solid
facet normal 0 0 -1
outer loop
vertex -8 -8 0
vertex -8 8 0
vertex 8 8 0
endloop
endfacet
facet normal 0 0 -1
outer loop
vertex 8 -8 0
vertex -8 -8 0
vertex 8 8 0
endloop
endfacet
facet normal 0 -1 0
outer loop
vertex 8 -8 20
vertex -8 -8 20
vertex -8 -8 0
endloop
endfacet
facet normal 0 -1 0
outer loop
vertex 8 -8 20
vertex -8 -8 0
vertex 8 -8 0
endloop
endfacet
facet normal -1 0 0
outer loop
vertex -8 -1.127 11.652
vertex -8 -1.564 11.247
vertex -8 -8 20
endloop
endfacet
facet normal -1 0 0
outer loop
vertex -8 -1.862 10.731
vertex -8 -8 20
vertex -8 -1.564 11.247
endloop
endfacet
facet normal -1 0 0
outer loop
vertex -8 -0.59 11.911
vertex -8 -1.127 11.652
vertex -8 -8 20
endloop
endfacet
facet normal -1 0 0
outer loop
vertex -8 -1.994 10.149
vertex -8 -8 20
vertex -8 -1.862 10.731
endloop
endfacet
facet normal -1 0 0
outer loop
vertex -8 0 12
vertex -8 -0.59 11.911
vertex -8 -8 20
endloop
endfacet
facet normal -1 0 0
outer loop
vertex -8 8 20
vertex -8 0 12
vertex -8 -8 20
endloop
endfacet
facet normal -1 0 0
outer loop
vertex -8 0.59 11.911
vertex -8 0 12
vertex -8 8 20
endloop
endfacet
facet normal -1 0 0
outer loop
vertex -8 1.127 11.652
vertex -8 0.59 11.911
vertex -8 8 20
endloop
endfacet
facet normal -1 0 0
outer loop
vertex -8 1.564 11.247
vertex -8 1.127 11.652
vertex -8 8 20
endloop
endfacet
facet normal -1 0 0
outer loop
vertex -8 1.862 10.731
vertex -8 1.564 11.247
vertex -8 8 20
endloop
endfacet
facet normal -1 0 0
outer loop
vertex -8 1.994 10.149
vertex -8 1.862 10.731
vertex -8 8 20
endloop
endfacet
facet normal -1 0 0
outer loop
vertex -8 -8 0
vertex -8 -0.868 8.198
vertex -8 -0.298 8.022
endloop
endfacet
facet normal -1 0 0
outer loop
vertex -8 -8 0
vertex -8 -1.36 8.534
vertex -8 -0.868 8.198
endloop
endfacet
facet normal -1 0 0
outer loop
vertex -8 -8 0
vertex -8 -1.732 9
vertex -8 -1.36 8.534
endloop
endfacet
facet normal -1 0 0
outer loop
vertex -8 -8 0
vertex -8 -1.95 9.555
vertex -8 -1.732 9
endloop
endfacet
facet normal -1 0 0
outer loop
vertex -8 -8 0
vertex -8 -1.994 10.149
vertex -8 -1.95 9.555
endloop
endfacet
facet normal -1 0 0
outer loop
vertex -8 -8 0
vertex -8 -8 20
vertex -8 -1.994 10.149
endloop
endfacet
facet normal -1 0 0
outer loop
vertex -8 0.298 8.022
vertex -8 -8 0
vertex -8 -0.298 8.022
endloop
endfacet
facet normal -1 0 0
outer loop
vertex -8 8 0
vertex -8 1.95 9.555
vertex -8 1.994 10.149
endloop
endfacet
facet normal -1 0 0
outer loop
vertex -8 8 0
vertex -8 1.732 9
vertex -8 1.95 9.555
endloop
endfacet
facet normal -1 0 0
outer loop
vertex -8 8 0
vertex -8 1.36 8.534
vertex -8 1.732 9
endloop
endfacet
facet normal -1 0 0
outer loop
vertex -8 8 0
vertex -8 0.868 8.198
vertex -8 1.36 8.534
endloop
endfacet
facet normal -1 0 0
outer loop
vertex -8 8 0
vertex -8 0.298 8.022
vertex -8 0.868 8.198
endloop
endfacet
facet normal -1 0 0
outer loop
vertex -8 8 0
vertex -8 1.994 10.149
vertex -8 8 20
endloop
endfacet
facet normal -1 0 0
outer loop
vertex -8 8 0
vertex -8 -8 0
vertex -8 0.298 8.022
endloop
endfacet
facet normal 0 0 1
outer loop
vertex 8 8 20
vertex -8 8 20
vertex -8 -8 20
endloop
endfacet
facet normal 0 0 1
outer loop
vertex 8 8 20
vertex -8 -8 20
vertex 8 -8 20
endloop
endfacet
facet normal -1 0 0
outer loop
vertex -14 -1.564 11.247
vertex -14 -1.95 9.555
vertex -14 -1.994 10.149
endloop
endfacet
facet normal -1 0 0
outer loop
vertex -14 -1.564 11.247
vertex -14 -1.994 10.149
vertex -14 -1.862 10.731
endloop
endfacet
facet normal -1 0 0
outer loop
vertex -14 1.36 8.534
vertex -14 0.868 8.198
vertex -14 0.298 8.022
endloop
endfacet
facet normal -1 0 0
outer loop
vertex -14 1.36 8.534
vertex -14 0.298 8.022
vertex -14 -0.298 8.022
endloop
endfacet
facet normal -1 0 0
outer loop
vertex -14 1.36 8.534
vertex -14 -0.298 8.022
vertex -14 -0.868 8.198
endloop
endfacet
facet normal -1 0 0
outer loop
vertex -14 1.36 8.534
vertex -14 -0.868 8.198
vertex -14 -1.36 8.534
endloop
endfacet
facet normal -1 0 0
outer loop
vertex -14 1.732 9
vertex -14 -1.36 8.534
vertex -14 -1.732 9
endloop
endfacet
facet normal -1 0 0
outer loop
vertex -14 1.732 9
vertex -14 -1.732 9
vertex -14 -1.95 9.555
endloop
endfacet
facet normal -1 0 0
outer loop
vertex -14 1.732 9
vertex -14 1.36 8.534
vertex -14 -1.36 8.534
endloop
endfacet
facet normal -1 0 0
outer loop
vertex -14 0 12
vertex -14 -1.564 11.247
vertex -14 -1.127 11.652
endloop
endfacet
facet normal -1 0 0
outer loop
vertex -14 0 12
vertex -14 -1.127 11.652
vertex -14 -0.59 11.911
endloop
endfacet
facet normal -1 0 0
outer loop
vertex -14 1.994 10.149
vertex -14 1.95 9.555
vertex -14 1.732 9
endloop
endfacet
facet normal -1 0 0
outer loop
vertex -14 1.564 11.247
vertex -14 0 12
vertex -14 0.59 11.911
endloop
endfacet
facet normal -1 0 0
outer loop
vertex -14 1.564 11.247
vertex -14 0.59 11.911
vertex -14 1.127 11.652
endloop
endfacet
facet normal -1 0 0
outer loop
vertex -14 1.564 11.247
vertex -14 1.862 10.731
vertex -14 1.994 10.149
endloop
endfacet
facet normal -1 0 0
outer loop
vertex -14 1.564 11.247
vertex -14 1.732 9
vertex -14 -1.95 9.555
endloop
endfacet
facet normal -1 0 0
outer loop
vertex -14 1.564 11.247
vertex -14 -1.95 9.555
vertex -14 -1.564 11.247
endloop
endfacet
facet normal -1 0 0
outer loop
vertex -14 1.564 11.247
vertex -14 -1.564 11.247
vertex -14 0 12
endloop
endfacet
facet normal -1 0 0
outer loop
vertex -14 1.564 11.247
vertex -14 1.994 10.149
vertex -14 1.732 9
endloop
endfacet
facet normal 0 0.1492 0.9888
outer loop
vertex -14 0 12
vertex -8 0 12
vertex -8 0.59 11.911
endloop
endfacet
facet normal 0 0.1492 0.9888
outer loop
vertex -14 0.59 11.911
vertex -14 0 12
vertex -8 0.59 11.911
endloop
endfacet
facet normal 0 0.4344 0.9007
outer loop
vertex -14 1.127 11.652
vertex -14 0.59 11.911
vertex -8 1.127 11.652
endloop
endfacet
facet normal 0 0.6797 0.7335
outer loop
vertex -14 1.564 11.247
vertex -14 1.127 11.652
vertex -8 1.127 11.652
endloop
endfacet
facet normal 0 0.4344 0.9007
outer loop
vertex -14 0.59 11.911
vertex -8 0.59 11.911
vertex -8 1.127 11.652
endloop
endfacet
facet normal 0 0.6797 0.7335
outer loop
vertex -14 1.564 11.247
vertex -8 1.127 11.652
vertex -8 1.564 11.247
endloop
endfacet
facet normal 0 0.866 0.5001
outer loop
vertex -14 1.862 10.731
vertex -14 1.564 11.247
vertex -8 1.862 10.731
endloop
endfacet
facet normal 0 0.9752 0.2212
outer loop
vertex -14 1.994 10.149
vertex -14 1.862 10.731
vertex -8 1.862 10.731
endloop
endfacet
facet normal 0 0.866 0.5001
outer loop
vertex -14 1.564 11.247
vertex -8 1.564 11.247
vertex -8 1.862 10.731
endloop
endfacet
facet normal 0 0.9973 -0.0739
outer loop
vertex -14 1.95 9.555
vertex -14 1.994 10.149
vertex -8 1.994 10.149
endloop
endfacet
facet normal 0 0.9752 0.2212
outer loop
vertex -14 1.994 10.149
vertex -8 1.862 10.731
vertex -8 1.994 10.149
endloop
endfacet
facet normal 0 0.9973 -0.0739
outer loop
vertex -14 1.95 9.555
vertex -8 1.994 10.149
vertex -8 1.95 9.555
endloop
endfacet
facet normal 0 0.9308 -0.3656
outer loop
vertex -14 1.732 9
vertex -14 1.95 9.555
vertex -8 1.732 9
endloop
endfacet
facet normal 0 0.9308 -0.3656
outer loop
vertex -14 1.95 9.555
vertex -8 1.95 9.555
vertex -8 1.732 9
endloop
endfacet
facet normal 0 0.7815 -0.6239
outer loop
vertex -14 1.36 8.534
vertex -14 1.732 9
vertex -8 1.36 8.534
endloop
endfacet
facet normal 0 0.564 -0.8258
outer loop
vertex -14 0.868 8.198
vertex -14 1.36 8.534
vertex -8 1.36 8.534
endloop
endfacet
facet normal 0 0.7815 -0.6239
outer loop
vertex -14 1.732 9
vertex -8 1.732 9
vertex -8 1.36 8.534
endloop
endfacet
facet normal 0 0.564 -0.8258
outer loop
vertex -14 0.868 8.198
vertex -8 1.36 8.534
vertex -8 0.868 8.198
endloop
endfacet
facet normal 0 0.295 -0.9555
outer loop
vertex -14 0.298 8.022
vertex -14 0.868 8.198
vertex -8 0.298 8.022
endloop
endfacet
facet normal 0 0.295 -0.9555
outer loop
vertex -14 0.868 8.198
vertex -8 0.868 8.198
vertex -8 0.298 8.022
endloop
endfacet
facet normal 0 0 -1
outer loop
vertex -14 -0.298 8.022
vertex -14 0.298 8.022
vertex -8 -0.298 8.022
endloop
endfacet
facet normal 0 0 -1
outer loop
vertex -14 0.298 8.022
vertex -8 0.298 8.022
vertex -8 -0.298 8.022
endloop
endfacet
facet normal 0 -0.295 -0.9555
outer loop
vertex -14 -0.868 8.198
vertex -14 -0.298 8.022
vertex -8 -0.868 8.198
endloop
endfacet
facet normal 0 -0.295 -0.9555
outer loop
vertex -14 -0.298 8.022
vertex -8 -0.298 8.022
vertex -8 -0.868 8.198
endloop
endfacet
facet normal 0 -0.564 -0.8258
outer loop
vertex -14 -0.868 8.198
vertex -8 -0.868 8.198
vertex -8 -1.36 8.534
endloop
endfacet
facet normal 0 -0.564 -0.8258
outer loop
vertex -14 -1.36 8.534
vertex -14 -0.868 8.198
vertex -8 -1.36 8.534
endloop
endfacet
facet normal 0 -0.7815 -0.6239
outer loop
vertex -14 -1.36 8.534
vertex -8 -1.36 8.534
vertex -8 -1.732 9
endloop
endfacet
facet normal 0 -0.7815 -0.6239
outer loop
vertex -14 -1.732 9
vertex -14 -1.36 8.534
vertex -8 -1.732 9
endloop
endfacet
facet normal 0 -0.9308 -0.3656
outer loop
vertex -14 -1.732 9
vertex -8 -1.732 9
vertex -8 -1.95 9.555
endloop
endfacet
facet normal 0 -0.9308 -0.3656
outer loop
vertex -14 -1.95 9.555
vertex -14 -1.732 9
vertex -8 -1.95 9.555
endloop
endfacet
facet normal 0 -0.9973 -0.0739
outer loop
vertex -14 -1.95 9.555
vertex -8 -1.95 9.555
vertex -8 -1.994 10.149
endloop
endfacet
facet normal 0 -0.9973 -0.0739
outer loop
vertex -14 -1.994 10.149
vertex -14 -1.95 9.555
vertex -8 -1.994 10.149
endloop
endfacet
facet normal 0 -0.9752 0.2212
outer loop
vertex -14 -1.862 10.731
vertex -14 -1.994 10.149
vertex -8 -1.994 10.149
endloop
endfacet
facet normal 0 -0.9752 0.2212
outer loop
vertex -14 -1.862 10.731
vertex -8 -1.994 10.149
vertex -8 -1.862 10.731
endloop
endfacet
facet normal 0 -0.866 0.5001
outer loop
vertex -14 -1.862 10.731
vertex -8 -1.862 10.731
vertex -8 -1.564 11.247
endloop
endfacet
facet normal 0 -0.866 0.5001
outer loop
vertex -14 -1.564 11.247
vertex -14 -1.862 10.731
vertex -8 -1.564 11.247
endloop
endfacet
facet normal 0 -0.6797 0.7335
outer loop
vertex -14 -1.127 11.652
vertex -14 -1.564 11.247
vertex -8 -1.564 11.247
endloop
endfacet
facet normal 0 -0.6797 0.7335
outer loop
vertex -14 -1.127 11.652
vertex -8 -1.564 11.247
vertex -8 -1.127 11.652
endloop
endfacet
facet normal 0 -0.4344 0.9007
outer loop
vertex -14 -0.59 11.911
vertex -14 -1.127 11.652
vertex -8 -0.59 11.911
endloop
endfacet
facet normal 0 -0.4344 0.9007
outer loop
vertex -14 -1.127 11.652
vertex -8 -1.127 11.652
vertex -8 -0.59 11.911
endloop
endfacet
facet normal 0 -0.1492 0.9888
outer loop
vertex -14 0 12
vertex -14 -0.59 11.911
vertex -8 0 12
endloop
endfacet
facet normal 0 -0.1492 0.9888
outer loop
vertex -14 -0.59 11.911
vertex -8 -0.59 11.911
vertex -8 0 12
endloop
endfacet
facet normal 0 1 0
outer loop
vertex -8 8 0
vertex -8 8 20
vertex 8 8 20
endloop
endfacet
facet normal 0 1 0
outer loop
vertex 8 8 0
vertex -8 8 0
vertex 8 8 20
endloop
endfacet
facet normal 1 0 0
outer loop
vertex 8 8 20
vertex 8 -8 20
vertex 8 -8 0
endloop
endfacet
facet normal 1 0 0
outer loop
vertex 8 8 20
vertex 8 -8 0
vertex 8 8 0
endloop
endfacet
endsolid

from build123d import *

# Parameters (mm, degrees)
SKETCH2_W           = 16
SKETCH2_H           = 16
BOSS_EXTRUDE1_DEPTH = 20
SKETCH3_R           = 2
BOSS_EXTRUDE2_DEPTH = 6


with BuildPart() as part:
    # Sketch2 → Boss-Extrude1 (new body)
    with BuildSketch(Plane.XY):
        Rectangle(SKETCH2_W, SKETCH2_H)
    extrude(amount=BOSS_EXTRUDE1_DEPTH)

    # Sketch3 → Boss-Extrude2 (add)
    with BuildSketch(Plane.ZY.offset(8)):
        with Locations((10, 0)):
            Circle(SKETCH3_R)
    extrude(amount=BOSS_EXTRUDE2_DEPTH)


solid = part.part
